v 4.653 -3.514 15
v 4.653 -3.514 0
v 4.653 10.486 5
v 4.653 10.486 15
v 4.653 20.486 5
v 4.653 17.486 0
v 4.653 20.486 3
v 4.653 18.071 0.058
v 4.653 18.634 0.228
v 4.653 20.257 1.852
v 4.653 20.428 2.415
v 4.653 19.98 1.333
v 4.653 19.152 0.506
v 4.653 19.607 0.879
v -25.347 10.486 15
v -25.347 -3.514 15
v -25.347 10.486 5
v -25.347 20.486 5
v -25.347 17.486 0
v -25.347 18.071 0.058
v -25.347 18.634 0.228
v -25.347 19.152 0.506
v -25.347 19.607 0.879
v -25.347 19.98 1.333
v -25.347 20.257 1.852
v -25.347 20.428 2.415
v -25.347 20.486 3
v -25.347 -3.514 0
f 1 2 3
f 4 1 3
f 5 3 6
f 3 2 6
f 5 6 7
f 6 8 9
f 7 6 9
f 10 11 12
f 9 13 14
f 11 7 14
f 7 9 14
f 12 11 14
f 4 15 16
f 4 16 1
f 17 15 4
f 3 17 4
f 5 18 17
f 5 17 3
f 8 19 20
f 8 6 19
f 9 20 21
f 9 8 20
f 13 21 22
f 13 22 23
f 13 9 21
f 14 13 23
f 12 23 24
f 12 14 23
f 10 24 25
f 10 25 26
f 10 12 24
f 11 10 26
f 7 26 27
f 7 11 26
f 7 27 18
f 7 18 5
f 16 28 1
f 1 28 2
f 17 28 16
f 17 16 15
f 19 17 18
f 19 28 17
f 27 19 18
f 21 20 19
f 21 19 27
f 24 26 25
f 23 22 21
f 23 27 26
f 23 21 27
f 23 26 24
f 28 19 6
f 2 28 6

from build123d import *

# Parameters (mm, degrees)
SKETCH_1_W          = 30
SKETCH_1_H          = 24
EXTRUDE_1_DEPTH     = 15
SKETCH_2_W          = 30
SKETCH_2_H          = 10
CUT_EXTRUDE_1_DEPTH = 10
FILLET_1_R          = 3


with BuildPart() as part:
    # 草图1 → 凸台-拉伸1 (new body)
    with BuildSketch(Plane.XY):
        with Locations((-10.346525097, 8.485714286)):
            Rectangle(SKETCH_1_W, SKETCH_1_H)
    extrude(amount=EXTRUDE_1_DEPTH)

    # 草图2 → 切除-拉伸1 (cut)
    with BuildSketch(Plane.XY.offset(15)):
        with Locations((-10.346525097, 15.485714286)):
            Rectangle(SKETCH_2_W, SKETCH_2_H)
    extrude(amount=-CUT_EXTRUDE_1_DEPTH, mode=Mode.SUBTRACT)

    # 圆角1
    fillet_1_edges = [part.edges().sort_by_distance(p)[0] for p in [
        (-10.346525097, 20.485714286, 0),
    ]]
    fillet(fillet_1_edges, radius=FILLET_1_R)


solid = part.part
